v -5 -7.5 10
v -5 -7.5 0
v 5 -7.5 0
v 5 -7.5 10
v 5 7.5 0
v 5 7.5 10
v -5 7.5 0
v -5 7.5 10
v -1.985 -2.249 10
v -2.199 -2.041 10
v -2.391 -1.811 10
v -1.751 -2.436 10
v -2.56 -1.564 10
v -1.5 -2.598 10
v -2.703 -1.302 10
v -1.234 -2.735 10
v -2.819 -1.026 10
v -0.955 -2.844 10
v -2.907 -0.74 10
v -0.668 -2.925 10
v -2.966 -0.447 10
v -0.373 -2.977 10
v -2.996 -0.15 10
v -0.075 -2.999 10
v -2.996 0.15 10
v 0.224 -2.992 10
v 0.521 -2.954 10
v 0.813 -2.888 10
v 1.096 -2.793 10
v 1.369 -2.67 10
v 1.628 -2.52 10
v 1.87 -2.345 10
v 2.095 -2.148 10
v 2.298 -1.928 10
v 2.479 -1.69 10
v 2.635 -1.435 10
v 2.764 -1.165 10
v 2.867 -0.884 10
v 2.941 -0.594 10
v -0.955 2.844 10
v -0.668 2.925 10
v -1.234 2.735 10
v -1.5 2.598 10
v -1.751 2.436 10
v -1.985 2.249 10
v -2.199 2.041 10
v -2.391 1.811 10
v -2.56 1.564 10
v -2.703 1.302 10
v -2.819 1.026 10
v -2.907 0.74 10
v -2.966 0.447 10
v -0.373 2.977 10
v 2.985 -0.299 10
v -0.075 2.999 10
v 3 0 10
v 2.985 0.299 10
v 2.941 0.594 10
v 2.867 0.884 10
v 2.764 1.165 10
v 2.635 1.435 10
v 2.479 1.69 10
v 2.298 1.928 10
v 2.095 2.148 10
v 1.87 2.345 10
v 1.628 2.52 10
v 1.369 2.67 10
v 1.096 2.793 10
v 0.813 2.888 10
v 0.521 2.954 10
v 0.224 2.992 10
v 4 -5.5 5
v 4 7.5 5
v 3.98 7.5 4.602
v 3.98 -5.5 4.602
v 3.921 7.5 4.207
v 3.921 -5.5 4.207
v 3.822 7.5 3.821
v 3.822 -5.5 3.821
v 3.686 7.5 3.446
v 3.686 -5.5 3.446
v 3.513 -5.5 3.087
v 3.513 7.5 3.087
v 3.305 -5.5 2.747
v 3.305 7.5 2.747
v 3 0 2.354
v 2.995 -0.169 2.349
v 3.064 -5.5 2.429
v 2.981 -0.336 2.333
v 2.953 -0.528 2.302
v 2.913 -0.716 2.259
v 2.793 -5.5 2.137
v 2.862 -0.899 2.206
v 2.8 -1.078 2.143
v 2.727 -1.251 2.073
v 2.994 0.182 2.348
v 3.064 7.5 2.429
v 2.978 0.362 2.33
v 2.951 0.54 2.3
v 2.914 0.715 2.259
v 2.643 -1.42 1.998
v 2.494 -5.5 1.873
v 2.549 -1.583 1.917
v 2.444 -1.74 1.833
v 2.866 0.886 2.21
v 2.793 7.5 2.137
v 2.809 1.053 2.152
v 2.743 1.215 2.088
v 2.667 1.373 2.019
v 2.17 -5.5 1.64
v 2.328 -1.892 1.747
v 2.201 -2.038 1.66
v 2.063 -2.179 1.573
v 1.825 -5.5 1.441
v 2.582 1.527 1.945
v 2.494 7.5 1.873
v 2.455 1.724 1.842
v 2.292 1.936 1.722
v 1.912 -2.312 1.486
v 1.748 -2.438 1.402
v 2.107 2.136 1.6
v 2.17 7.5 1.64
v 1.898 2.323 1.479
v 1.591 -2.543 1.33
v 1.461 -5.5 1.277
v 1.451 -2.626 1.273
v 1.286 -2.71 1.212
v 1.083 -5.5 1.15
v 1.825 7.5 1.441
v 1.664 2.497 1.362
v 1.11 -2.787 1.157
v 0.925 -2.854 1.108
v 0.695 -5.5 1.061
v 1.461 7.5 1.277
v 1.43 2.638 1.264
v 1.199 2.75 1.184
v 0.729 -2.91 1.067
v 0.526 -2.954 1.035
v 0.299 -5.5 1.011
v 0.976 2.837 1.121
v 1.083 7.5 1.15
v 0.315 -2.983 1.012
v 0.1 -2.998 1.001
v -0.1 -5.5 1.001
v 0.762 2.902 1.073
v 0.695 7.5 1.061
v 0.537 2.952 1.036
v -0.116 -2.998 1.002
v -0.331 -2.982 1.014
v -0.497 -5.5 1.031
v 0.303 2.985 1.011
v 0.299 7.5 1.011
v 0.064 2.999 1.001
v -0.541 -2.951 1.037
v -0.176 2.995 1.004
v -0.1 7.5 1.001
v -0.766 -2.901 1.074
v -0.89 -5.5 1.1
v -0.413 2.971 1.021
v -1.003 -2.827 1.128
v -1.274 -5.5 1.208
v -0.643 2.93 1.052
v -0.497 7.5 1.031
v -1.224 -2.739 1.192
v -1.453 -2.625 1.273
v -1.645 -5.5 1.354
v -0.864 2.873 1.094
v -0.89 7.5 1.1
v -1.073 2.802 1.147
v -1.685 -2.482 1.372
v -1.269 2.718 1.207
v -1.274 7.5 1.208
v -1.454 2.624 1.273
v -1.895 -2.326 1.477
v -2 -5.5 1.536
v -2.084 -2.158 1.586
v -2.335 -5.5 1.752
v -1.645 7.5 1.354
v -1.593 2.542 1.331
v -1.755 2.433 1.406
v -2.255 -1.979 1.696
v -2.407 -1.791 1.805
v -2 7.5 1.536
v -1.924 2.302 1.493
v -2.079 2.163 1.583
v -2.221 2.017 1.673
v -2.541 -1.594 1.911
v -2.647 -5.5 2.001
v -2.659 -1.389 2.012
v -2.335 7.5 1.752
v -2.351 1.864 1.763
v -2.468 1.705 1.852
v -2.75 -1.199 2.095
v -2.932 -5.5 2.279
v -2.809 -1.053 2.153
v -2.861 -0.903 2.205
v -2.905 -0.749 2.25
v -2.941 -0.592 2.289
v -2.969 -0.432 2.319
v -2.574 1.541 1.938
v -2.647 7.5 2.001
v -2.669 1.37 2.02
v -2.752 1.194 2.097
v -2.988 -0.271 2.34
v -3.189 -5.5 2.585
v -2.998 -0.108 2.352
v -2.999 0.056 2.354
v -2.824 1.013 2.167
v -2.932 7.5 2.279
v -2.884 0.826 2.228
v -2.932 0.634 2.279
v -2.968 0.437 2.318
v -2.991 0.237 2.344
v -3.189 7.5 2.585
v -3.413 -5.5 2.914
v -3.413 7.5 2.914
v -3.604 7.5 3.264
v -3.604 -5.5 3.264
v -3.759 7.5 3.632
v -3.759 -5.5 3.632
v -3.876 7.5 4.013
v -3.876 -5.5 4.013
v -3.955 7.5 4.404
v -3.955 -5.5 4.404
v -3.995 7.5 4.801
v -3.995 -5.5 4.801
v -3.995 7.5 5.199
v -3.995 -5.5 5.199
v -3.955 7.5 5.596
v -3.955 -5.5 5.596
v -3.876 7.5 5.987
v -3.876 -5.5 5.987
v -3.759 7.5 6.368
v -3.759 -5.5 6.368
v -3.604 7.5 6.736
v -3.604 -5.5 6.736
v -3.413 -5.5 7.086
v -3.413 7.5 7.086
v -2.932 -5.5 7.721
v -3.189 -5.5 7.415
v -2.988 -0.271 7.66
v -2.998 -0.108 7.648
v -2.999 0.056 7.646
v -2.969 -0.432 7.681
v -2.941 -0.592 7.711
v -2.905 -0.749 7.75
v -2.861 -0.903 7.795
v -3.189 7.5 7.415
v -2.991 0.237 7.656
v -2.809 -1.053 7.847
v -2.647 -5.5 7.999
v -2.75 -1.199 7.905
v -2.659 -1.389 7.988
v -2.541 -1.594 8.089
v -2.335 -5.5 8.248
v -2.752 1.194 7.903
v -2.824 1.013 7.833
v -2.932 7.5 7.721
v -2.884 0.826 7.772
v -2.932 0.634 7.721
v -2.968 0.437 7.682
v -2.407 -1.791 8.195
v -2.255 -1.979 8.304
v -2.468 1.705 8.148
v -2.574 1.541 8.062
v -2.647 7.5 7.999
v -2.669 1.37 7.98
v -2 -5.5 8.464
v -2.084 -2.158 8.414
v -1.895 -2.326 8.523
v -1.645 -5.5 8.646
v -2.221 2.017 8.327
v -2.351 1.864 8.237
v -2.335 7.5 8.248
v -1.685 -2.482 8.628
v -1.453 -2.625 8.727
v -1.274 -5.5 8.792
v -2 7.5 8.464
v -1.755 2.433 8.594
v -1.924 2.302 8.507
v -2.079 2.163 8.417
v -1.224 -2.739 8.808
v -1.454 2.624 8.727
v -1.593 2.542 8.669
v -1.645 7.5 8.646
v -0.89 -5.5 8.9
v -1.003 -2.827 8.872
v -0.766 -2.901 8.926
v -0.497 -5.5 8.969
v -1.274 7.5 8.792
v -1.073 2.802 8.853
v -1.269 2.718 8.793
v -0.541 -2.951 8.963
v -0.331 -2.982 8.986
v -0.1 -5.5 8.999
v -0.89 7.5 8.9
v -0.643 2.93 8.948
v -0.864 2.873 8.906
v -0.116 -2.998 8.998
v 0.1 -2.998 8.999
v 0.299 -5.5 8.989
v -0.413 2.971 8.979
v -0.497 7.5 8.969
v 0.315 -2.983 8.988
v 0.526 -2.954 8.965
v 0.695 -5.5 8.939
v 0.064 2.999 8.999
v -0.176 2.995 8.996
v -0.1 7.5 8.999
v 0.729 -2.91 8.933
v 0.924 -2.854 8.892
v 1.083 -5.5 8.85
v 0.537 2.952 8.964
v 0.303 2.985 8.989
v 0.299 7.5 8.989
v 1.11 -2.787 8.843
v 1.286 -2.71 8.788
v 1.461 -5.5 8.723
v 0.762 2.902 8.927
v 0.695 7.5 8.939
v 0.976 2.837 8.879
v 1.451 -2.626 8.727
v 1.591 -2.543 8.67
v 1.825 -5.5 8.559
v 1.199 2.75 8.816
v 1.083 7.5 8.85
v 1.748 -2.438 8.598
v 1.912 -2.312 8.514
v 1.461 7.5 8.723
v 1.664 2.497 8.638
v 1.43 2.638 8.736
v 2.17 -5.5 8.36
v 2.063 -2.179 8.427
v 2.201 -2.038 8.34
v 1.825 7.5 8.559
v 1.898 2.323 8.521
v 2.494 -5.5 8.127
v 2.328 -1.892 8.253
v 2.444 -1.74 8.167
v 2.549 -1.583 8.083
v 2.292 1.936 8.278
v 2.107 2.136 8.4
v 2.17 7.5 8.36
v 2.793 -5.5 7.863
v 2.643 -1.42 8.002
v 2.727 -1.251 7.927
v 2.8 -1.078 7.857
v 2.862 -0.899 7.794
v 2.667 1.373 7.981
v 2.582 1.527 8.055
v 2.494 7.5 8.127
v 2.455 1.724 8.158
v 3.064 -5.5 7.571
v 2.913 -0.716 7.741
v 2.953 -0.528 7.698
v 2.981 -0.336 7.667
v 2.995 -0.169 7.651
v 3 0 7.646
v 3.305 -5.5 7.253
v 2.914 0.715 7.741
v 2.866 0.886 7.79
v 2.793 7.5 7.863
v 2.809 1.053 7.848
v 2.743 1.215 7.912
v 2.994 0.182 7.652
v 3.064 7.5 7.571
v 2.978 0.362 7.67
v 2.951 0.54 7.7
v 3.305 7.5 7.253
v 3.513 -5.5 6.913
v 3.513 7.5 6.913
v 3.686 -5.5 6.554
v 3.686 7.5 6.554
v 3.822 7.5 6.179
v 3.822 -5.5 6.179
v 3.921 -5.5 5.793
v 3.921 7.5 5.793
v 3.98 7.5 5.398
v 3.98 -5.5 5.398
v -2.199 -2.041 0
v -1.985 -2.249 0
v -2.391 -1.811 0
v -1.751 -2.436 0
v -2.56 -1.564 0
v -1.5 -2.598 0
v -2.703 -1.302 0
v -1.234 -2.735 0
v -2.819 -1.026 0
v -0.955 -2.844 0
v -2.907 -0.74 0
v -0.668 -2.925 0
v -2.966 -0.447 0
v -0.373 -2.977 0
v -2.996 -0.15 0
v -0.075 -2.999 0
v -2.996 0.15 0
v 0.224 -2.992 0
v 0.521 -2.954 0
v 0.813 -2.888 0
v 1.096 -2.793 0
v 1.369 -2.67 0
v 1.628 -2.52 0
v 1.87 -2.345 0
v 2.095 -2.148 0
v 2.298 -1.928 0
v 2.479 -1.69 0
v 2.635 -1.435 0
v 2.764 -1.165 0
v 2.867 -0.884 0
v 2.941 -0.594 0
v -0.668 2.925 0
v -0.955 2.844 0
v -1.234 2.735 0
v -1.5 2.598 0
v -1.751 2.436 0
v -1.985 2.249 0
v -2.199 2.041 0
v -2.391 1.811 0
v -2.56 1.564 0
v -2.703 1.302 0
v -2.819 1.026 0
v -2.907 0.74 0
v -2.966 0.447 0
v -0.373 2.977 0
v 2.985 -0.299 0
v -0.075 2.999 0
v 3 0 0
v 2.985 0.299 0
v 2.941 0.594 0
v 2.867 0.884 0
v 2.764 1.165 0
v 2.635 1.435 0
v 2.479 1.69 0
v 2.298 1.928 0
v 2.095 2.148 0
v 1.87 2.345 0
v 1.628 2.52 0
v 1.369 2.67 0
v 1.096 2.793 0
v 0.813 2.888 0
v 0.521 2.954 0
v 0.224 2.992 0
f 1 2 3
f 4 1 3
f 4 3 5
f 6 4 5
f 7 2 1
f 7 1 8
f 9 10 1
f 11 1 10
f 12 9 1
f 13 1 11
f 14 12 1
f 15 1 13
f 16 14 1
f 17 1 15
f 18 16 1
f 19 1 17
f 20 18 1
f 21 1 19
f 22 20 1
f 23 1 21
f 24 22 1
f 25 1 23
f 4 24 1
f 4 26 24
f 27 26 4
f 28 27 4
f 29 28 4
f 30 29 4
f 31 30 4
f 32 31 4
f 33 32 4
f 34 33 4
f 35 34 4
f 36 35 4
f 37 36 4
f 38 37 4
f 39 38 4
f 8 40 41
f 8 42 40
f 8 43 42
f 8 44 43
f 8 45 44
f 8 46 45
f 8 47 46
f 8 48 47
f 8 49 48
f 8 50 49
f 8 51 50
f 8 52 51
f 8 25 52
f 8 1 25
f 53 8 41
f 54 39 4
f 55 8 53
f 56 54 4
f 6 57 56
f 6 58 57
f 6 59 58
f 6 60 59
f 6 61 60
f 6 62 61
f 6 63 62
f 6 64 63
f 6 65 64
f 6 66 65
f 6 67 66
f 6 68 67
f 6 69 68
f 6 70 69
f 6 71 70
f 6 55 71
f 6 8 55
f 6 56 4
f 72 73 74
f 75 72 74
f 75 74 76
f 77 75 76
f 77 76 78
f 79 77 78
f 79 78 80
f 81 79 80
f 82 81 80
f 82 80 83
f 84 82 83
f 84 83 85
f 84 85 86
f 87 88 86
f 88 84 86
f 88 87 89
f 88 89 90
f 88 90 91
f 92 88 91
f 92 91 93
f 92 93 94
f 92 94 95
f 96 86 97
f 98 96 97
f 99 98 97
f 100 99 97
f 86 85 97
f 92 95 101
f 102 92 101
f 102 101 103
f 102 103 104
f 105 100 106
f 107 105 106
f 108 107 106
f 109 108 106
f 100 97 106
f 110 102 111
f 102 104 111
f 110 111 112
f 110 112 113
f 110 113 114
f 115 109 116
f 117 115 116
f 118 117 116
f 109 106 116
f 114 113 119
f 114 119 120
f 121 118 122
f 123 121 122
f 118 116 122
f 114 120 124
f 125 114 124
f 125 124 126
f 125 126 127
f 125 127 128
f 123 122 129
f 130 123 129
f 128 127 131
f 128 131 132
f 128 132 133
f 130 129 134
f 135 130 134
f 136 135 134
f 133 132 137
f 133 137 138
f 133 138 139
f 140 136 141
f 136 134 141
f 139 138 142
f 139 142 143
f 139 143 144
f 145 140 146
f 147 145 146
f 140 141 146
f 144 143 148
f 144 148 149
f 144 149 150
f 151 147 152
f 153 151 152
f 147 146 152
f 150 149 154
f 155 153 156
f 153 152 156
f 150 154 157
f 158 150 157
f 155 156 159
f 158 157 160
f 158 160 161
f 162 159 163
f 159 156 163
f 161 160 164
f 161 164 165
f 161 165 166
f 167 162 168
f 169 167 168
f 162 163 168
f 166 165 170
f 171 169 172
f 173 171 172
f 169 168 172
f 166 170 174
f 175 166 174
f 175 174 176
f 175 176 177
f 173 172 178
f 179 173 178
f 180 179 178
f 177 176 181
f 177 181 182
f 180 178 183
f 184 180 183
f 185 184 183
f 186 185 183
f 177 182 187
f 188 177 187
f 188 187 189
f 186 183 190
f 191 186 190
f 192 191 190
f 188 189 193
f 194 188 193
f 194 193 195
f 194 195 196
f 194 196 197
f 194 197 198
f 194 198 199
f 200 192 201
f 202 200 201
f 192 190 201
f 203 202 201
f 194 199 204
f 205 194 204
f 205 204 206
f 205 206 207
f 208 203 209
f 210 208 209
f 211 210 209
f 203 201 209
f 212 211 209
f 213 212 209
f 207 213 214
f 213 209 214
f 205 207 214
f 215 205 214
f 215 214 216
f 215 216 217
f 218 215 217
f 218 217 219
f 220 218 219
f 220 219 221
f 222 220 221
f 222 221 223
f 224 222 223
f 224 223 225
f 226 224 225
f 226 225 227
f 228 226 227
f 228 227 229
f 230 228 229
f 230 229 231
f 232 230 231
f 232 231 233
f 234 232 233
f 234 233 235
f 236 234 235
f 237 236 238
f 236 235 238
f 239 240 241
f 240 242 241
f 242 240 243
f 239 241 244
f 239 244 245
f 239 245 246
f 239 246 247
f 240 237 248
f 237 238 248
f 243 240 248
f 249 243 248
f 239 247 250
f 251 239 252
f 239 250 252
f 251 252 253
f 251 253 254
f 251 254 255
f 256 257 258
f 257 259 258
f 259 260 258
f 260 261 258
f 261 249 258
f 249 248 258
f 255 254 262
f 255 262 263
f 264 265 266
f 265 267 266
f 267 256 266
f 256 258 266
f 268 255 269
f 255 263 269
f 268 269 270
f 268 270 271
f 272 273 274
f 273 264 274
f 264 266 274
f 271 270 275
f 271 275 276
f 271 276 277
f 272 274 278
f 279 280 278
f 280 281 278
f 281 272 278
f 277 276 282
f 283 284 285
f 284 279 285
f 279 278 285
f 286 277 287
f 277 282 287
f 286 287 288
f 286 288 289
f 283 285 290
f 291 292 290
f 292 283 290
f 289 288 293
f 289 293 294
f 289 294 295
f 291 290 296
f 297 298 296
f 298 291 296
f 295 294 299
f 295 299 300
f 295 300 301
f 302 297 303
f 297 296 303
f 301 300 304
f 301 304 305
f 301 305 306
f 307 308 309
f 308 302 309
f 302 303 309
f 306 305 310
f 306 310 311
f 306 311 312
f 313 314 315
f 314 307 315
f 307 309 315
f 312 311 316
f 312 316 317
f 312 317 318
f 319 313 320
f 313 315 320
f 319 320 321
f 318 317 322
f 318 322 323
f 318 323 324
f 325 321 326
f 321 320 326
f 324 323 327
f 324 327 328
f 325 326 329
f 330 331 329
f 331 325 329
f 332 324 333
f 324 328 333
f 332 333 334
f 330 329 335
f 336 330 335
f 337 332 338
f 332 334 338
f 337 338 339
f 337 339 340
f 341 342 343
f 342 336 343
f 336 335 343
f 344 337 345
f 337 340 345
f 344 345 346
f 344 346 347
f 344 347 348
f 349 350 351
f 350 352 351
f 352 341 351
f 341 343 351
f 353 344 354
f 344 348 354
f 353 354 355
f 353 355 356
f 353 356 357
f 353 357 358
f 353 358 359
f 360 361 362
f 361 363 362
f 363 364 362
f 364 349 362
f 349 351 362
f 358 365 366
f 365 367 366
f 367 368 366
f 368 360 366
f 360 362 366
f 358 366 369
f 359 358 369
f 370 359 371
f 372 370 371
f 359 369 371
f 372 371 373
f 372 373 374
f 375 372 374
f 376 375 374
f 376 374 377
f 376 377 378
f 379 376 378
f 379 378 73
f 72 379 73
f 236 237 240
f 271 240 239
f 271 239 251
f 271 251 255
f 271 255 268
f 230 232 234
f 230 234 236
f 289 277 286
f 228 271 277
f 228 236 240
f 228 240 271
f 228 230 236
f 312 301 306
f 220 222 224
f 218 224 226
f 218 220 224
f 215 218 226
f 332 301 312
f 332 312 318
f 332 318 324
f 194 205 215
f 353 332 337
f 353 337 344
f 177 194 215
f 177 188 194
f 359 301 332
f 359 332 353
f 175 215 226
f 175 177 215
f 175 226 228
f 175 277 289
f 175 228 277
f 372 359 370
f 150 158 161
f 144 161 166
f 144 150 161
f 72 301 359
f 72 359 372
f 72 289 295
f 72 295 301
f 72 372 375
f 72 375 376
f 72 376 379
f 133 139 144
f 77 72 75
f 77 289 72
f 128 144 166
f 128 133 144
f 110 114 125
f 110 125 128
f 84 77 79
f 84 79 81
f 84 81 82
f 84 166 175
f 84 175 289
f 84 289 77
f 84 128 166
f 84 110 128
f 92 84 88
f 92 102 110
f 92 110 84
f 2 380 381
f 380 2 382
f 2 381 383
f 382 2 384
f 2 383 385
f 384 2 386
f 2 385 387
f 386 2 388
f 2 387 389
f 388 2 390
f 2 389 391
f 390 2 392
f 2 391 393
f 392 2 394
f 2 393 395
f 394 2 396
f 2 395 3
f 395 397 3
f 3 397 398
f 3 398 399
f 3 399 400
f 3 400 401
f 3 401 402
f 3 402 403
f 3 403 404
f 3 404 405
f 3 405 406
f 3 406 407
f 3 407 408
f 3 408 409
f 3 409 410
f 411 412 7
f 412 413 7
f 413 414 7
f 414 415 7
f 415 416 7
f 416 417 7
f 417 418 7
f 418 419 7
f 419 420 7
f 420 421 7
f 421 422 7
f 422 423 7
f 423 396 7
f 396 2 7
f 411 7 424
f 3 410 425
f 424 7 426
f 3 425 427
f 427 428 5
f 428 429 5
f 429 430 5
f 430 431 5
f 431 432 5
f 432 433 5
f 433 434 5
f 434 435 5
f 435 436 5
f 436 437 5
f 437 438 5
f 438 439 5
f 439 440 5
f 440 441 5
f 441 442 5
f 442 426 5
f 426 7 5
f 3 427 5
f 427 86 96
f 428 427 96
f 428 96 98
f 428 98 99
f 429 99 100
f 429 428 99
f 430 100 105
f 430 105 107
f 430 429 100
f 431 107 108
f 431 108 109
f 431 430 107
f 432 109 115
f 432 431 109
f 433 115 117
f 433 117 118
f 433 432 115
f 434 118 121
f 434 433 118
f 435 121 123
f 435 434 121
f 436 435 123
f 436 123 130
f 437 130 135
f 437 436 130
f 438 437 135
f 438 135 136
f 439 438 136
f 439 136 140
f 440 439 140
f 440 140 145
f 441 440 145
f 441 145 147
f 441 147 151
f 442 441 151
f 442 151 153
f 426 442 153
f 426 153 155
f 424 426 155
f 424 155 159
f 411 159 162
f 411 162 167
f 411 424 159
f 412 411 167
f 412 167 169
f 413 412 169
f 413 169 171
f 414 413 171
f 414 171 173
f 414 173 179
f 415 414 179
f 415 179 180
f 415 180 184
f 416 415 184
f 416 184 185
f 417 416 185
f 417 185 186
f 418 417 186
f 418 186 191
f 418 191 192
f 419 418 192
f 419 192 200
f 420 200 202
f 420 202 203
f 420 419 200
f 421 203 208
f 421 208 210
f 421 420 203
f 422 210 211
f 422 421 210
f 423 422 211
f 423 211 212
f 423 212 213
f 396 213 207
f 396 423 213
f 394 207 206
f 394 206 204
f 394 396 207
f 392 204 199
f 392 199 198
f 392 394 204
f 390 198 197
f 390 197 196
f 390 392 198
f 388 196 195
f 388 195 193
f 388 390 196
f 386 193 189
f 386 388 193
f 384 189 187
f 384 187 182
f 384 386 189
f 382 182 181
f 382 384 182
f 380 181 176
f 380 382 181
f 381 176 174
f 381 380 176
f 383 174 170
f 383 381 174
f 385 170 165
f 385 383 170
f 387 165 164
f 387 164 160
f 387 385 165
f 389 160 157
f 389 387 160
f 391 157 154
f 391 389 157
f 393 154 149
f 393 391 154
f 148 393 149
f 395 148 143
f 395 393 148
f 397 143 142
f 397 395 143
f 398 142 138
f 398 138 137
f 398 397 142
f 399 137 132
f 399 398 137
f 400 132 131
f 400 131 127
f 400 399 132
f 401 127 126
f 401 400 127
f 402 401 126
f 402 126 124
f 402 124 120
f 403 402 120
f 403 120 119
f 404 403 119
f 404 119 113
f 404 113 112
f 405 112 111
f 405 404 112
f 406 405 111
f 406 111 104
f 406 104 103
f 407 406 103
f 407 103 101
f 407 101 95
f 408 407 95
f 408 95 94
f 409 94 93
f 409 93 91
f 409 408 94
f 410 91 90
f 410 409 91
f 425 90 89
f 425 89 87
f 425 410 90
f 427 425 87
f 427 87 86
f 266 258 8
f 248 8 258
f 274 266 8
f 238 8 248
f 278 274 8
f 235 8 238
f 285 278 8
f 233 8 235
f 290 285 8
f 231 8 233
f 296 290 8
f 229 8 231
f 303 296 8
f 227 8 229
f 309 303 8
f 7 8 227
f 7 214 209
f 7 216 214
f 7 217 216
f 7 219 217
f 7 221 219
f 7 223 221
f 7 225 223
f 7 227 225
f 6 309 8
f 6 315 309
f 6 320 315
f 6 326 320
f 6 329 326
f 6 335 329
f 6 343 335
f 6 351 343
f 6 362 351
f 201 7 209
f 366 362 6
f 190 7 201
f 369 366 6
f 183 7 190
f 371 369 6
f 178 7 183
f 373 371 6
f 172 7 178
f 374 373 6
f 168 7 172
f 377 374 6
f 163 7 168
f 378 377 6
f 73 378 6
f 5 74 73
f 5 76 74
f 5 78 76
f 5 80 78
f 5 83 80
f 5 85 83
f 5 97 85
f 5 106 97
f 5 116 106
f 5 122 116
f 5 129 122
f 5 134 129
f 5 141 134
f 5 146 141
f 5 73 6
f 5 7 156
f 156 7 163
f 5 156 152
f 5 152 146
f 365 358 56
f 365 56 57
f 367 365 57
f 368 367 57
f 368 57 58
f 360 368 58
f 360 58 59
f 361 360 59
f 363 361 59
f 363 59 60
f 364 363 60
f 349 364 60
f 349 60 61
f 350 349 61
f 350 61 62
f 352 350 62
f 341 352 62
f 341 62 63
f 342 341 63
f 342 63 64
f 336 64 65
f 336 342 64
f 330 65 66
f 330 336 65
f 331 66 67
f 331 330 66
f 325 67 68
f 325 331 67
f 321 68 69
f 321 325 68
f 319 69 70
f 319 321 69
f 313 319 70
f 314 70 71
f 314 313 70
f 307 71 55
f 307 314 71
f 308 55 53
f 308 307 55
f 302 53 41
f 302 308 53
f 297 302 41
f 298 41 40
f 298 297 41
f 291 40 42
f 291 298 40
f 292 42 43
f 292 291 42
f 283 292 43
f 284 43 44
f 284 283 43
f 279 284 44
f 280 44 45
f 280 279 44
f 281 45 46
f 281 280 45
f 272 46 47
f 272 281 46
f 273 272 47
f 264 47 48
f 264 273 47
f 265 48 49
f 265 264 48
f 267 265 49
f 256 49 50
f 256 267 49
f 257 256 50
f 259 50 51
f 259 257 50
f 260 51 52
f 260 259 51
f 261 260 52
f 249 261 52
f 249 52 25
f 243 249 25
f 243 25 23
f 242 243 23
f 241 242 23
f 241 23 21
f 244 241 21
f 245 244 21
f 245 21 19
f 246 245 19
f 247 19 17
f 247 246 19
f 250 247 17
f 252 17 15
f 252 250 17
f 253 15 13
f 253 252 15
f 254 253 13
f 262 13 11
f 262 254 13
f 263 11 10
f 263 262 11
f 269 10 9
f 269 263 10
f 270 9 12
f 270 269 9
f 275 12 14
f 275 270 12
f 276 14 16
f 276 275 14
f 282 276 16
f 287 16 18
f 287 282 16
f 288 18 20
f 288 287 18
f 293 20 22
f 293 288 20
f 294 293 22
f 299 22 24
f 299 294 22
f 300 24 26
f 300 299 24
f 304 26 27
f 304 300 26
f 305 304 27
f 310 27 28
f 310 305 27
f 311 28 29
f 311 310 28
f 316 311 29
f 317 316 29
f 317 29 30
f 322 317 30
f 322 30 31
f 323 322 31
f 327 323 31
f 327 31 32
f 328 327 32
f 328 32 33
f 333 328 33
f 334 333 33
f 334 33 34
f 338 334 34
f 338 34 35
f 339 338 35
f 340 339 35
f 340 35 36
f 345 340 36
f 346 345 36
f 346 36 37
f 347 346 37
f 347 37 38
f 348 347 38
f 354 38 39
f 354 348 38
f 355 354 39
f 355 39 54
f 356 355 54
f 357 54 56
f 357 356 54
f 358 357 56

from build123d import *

# Parameters (mm, degrees)
SKETCH1_W           = 10
SKETCH1_H           = 15
SKETCH1_R           = 3
BOSS_EXTRUDE1_DEPTH = 10
SKETCH3_R           = 4
CUT_EXTRUDE1_DEPTH  = 13


with BuildPart() as part:
    # Sketch1 → Boss-Extrude1 (new body)
    with BuildSketch(Plane.XY):
        Rectangle(SKETCH1_W, SKETCH1_H)
        Circle(SKETCH1_R, mode=Mode.SUBTRACT)
    extrude(amount=BOSS_EXTRUDE1_DEPTH)

    # Sketch3 → Cut-Extrude1 (cut)
    with BuildSketch(Plane(origin=(0, 7.5, 0), x_dir=(1, 0, 0), z_dir=(0, 1, 0))):
        with Locations((0, -5)):
            Circle(SKETCH3_R)
    extrude(amount=-CUT_EXTRUDE1_DEPTH, mode=Mode.SUBTRACT)


solid = part.part
